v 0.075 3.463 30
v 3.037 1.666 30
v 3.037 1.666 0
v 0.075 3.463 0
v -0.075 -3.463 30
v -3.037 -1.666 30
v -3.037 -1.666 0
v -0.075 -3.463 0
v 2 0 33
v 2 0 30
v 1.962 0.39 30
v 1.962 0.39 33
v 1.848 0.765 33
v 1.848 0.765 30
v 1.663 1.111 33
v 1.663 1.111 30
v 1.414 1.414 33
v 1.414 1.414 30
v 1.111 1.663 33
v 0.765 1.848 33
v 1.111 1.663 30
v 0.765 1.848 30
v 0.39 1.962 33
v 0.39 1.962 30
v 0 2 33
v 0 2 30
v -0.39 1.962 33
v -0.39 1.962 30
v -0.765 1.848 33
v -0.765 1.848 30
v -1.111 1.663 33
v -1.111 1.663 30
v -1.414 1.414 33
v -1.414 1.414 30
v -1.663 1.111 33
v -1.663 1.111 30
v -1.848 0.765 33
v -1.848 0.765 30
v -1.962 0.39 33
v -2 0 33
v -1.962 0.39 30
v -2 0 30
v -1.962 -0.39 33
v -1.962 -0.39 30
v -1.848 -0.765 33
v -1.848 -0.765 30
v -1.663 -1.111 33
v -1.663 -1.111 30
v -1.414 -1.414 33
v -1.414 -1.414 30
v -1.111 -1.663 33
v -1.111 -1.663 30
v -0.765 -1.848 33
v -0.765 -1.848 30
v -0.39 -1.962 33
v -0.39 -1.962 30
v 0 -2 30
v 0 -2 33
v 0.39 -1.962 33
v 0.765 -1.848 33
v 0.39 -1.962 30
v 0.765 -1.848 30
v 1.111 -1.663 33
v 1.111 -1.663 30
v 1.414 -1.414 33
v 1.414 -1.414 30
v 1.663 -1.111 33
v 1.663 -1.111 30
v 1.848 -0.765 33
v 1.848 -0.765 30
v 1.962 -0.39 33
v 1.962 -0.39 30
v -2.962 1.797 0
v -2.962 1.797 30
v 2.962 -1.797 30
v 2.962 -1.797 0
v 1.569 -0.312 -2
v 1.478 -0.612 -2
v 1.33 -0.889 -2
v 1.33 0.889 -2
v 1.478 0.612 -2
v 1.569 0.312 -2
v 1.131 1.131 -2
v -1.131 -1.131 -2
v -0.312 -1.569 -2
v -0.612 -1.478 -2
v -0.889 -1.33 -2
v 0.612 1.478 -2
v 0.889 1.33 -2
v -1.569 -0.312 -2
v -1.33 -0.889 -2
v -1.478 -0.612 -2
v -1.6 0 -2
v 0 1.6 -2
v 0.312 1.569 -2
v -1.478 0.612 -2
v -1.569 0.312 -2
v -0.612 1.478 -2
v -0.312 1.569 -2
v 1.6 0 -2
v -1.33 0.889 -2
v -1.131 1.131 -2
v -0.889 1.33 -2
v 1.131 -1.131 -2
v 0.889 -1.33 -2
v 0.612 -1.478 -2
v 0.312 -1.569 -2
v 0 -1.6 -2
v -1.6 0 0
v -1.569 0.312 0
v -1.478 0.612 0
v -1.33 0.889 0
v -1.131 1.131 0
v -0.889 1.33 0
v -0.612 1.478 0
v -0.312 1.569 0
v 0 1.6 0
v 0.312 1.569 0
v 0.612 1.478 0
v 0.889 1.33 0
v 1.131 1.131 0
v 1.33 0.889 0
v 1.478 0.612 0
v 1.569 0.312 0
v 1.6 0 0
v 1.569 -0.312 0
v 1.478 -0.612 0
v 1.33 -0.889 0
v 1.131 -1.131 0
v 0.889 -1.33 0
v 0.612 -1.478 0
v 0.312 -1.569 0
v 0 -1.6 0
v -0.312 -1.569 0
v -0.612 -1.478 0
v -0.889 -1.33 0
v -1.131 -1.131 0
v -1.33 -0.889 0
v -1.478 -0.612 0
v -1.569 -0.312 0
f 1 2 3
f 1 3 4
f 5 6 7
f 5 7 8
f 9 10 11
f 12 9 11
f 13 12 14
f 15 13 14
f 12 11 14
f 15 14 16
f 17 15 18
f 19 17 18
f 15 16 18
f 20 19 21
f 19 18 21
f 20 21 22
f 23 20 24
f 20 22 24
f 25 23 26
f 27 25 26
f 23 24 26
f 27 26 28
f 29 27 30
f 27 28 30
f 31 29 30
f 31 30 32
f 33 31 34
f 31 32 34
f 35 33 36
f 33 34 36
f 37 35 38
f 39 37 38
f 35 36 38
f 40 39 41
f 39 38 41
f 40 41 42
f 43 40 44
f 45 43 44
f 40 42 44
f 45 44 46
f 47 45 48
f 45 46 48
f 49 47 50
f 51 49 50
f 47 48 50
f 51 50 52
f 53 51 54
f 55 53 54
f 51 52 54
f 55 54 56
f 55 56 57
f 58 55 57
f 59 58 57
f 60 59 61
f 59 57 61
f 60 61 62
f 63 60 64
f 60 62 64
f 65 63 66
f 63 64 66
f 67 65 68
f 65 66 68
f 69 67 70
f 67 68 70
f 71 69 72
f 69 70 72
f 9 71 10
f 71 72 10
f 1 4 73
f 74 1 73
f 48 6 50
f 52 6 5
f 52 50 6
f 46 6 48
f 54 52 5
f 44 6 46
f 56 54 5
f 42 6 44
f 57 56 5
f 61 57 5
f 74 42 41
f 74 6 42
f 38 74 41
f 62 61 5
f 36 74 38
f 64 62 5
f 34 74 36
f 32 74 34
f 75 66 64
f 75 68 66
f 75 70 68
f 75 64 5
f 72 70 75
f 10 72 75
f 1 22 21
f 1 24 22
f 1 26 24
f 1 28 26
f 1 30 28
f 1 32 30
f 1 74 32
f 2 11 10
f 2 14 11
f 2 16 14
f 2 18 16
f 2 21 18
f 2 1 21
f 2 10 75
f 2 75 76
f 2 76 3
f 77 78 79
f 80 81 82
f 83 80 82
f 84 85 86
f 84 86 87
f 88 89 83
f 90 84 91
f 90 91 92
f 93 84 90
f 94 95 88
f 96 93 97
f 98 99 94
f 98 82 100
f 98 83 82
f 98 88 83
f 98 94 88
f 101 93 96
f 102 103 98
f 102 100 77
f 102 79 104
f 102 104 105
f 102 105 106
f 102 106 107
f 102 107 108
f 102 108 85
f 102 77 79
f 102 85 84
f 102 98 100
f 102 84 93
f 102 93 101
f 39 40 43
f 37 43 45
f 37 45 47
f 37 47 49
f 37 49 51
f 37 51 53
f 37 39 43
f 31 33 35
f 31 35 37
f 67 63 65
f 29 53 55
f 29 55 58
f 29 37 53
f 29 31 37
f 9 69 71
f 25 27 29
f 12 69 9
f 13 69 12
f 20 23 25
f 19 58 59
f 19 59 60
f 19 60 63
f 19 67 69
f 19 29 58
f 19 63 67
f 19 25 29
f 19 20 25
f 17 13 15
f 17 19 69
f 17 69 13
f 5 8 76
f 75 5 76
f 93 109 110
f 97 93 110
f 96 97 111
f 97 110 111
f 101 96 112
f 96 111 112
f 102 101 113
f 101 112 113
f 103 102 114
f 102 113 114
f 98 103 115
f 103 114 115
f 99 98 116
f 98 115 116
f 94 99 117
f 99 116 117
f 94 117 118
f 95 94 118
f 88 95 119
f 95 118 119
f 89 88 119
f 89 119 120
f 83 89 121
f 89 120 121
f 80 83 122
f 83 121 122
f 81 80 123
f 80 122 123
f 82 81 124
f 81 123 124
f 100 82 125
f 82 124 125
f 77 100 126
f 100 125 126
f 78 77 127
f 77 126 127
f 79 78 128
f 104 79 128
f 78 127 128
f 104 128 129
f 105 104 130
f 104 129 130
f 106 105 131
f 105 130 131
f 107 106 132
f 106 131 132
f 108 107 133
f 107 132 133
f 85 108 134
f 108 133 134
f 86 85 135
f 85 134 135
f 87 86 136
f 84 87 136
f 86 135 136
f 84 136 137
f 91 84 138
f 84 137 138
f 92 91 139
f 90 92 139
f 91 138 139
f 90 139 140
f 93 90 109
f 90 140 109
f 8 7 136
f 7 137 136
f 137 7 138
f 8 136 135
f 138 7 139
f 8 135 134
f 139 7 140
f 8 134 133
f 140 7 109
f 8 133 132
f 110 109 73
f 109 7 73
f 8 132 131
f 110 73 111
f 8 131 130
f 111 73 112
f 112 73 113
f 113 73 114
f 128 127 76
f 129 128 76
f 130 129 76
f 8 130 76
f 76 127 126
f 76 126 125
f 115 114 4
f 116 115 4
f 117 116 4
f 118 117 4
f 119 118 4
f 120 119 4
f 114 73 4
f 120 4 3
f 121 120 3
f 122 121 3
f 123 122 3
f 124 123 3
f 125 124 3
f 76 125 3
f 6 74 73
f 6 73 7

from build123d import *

# Parameters (mm, degrees)
BOSS_EXTRUDE1_DEPTH = 30
SKETCH2_R           = 2
BOSS_EXTRUDE2_DEPTH = 3
SKETCH3_R           = 1.6
BOSS_EXTRUDE3_DEPTH = 2


with BuildPart() as part:
    # Sketch1 → Boss-Extrude1 (new body)
    with BuildSketch(Plane.XY):
        Polygon((2.961597897, -1.796924567), (3.036981272, 1.666356731), (0.075383375, 3.463281298), (-2.961597897, 1.796924567), (-3.036981272, -1.666356731), (-0.075383375, -3.463281298), align=None)
    extrude(amount=BOSS_EXTRUDE1_DEPTH)

    # Sketch2 → Boss-Extrude2 (add)
    with BuildSketch(Plane.XY.offset(30)):
        Circle(SKETCH2_R)
    extrude(amount=BOSS_EXTRUDE2_DEPTH)

    # Sketch3 → Boss-Extrude3 (add)
    with BuildSketch(Plane(origin=(0, 0, 0), x_dir=(-1, 0, 0), z_dir=(0, 0, -1))):
        Circle(SKETCH3_R)
    extrude(amount=BOSS_EXTRUDE3_DEPTH)


solid = part.part
